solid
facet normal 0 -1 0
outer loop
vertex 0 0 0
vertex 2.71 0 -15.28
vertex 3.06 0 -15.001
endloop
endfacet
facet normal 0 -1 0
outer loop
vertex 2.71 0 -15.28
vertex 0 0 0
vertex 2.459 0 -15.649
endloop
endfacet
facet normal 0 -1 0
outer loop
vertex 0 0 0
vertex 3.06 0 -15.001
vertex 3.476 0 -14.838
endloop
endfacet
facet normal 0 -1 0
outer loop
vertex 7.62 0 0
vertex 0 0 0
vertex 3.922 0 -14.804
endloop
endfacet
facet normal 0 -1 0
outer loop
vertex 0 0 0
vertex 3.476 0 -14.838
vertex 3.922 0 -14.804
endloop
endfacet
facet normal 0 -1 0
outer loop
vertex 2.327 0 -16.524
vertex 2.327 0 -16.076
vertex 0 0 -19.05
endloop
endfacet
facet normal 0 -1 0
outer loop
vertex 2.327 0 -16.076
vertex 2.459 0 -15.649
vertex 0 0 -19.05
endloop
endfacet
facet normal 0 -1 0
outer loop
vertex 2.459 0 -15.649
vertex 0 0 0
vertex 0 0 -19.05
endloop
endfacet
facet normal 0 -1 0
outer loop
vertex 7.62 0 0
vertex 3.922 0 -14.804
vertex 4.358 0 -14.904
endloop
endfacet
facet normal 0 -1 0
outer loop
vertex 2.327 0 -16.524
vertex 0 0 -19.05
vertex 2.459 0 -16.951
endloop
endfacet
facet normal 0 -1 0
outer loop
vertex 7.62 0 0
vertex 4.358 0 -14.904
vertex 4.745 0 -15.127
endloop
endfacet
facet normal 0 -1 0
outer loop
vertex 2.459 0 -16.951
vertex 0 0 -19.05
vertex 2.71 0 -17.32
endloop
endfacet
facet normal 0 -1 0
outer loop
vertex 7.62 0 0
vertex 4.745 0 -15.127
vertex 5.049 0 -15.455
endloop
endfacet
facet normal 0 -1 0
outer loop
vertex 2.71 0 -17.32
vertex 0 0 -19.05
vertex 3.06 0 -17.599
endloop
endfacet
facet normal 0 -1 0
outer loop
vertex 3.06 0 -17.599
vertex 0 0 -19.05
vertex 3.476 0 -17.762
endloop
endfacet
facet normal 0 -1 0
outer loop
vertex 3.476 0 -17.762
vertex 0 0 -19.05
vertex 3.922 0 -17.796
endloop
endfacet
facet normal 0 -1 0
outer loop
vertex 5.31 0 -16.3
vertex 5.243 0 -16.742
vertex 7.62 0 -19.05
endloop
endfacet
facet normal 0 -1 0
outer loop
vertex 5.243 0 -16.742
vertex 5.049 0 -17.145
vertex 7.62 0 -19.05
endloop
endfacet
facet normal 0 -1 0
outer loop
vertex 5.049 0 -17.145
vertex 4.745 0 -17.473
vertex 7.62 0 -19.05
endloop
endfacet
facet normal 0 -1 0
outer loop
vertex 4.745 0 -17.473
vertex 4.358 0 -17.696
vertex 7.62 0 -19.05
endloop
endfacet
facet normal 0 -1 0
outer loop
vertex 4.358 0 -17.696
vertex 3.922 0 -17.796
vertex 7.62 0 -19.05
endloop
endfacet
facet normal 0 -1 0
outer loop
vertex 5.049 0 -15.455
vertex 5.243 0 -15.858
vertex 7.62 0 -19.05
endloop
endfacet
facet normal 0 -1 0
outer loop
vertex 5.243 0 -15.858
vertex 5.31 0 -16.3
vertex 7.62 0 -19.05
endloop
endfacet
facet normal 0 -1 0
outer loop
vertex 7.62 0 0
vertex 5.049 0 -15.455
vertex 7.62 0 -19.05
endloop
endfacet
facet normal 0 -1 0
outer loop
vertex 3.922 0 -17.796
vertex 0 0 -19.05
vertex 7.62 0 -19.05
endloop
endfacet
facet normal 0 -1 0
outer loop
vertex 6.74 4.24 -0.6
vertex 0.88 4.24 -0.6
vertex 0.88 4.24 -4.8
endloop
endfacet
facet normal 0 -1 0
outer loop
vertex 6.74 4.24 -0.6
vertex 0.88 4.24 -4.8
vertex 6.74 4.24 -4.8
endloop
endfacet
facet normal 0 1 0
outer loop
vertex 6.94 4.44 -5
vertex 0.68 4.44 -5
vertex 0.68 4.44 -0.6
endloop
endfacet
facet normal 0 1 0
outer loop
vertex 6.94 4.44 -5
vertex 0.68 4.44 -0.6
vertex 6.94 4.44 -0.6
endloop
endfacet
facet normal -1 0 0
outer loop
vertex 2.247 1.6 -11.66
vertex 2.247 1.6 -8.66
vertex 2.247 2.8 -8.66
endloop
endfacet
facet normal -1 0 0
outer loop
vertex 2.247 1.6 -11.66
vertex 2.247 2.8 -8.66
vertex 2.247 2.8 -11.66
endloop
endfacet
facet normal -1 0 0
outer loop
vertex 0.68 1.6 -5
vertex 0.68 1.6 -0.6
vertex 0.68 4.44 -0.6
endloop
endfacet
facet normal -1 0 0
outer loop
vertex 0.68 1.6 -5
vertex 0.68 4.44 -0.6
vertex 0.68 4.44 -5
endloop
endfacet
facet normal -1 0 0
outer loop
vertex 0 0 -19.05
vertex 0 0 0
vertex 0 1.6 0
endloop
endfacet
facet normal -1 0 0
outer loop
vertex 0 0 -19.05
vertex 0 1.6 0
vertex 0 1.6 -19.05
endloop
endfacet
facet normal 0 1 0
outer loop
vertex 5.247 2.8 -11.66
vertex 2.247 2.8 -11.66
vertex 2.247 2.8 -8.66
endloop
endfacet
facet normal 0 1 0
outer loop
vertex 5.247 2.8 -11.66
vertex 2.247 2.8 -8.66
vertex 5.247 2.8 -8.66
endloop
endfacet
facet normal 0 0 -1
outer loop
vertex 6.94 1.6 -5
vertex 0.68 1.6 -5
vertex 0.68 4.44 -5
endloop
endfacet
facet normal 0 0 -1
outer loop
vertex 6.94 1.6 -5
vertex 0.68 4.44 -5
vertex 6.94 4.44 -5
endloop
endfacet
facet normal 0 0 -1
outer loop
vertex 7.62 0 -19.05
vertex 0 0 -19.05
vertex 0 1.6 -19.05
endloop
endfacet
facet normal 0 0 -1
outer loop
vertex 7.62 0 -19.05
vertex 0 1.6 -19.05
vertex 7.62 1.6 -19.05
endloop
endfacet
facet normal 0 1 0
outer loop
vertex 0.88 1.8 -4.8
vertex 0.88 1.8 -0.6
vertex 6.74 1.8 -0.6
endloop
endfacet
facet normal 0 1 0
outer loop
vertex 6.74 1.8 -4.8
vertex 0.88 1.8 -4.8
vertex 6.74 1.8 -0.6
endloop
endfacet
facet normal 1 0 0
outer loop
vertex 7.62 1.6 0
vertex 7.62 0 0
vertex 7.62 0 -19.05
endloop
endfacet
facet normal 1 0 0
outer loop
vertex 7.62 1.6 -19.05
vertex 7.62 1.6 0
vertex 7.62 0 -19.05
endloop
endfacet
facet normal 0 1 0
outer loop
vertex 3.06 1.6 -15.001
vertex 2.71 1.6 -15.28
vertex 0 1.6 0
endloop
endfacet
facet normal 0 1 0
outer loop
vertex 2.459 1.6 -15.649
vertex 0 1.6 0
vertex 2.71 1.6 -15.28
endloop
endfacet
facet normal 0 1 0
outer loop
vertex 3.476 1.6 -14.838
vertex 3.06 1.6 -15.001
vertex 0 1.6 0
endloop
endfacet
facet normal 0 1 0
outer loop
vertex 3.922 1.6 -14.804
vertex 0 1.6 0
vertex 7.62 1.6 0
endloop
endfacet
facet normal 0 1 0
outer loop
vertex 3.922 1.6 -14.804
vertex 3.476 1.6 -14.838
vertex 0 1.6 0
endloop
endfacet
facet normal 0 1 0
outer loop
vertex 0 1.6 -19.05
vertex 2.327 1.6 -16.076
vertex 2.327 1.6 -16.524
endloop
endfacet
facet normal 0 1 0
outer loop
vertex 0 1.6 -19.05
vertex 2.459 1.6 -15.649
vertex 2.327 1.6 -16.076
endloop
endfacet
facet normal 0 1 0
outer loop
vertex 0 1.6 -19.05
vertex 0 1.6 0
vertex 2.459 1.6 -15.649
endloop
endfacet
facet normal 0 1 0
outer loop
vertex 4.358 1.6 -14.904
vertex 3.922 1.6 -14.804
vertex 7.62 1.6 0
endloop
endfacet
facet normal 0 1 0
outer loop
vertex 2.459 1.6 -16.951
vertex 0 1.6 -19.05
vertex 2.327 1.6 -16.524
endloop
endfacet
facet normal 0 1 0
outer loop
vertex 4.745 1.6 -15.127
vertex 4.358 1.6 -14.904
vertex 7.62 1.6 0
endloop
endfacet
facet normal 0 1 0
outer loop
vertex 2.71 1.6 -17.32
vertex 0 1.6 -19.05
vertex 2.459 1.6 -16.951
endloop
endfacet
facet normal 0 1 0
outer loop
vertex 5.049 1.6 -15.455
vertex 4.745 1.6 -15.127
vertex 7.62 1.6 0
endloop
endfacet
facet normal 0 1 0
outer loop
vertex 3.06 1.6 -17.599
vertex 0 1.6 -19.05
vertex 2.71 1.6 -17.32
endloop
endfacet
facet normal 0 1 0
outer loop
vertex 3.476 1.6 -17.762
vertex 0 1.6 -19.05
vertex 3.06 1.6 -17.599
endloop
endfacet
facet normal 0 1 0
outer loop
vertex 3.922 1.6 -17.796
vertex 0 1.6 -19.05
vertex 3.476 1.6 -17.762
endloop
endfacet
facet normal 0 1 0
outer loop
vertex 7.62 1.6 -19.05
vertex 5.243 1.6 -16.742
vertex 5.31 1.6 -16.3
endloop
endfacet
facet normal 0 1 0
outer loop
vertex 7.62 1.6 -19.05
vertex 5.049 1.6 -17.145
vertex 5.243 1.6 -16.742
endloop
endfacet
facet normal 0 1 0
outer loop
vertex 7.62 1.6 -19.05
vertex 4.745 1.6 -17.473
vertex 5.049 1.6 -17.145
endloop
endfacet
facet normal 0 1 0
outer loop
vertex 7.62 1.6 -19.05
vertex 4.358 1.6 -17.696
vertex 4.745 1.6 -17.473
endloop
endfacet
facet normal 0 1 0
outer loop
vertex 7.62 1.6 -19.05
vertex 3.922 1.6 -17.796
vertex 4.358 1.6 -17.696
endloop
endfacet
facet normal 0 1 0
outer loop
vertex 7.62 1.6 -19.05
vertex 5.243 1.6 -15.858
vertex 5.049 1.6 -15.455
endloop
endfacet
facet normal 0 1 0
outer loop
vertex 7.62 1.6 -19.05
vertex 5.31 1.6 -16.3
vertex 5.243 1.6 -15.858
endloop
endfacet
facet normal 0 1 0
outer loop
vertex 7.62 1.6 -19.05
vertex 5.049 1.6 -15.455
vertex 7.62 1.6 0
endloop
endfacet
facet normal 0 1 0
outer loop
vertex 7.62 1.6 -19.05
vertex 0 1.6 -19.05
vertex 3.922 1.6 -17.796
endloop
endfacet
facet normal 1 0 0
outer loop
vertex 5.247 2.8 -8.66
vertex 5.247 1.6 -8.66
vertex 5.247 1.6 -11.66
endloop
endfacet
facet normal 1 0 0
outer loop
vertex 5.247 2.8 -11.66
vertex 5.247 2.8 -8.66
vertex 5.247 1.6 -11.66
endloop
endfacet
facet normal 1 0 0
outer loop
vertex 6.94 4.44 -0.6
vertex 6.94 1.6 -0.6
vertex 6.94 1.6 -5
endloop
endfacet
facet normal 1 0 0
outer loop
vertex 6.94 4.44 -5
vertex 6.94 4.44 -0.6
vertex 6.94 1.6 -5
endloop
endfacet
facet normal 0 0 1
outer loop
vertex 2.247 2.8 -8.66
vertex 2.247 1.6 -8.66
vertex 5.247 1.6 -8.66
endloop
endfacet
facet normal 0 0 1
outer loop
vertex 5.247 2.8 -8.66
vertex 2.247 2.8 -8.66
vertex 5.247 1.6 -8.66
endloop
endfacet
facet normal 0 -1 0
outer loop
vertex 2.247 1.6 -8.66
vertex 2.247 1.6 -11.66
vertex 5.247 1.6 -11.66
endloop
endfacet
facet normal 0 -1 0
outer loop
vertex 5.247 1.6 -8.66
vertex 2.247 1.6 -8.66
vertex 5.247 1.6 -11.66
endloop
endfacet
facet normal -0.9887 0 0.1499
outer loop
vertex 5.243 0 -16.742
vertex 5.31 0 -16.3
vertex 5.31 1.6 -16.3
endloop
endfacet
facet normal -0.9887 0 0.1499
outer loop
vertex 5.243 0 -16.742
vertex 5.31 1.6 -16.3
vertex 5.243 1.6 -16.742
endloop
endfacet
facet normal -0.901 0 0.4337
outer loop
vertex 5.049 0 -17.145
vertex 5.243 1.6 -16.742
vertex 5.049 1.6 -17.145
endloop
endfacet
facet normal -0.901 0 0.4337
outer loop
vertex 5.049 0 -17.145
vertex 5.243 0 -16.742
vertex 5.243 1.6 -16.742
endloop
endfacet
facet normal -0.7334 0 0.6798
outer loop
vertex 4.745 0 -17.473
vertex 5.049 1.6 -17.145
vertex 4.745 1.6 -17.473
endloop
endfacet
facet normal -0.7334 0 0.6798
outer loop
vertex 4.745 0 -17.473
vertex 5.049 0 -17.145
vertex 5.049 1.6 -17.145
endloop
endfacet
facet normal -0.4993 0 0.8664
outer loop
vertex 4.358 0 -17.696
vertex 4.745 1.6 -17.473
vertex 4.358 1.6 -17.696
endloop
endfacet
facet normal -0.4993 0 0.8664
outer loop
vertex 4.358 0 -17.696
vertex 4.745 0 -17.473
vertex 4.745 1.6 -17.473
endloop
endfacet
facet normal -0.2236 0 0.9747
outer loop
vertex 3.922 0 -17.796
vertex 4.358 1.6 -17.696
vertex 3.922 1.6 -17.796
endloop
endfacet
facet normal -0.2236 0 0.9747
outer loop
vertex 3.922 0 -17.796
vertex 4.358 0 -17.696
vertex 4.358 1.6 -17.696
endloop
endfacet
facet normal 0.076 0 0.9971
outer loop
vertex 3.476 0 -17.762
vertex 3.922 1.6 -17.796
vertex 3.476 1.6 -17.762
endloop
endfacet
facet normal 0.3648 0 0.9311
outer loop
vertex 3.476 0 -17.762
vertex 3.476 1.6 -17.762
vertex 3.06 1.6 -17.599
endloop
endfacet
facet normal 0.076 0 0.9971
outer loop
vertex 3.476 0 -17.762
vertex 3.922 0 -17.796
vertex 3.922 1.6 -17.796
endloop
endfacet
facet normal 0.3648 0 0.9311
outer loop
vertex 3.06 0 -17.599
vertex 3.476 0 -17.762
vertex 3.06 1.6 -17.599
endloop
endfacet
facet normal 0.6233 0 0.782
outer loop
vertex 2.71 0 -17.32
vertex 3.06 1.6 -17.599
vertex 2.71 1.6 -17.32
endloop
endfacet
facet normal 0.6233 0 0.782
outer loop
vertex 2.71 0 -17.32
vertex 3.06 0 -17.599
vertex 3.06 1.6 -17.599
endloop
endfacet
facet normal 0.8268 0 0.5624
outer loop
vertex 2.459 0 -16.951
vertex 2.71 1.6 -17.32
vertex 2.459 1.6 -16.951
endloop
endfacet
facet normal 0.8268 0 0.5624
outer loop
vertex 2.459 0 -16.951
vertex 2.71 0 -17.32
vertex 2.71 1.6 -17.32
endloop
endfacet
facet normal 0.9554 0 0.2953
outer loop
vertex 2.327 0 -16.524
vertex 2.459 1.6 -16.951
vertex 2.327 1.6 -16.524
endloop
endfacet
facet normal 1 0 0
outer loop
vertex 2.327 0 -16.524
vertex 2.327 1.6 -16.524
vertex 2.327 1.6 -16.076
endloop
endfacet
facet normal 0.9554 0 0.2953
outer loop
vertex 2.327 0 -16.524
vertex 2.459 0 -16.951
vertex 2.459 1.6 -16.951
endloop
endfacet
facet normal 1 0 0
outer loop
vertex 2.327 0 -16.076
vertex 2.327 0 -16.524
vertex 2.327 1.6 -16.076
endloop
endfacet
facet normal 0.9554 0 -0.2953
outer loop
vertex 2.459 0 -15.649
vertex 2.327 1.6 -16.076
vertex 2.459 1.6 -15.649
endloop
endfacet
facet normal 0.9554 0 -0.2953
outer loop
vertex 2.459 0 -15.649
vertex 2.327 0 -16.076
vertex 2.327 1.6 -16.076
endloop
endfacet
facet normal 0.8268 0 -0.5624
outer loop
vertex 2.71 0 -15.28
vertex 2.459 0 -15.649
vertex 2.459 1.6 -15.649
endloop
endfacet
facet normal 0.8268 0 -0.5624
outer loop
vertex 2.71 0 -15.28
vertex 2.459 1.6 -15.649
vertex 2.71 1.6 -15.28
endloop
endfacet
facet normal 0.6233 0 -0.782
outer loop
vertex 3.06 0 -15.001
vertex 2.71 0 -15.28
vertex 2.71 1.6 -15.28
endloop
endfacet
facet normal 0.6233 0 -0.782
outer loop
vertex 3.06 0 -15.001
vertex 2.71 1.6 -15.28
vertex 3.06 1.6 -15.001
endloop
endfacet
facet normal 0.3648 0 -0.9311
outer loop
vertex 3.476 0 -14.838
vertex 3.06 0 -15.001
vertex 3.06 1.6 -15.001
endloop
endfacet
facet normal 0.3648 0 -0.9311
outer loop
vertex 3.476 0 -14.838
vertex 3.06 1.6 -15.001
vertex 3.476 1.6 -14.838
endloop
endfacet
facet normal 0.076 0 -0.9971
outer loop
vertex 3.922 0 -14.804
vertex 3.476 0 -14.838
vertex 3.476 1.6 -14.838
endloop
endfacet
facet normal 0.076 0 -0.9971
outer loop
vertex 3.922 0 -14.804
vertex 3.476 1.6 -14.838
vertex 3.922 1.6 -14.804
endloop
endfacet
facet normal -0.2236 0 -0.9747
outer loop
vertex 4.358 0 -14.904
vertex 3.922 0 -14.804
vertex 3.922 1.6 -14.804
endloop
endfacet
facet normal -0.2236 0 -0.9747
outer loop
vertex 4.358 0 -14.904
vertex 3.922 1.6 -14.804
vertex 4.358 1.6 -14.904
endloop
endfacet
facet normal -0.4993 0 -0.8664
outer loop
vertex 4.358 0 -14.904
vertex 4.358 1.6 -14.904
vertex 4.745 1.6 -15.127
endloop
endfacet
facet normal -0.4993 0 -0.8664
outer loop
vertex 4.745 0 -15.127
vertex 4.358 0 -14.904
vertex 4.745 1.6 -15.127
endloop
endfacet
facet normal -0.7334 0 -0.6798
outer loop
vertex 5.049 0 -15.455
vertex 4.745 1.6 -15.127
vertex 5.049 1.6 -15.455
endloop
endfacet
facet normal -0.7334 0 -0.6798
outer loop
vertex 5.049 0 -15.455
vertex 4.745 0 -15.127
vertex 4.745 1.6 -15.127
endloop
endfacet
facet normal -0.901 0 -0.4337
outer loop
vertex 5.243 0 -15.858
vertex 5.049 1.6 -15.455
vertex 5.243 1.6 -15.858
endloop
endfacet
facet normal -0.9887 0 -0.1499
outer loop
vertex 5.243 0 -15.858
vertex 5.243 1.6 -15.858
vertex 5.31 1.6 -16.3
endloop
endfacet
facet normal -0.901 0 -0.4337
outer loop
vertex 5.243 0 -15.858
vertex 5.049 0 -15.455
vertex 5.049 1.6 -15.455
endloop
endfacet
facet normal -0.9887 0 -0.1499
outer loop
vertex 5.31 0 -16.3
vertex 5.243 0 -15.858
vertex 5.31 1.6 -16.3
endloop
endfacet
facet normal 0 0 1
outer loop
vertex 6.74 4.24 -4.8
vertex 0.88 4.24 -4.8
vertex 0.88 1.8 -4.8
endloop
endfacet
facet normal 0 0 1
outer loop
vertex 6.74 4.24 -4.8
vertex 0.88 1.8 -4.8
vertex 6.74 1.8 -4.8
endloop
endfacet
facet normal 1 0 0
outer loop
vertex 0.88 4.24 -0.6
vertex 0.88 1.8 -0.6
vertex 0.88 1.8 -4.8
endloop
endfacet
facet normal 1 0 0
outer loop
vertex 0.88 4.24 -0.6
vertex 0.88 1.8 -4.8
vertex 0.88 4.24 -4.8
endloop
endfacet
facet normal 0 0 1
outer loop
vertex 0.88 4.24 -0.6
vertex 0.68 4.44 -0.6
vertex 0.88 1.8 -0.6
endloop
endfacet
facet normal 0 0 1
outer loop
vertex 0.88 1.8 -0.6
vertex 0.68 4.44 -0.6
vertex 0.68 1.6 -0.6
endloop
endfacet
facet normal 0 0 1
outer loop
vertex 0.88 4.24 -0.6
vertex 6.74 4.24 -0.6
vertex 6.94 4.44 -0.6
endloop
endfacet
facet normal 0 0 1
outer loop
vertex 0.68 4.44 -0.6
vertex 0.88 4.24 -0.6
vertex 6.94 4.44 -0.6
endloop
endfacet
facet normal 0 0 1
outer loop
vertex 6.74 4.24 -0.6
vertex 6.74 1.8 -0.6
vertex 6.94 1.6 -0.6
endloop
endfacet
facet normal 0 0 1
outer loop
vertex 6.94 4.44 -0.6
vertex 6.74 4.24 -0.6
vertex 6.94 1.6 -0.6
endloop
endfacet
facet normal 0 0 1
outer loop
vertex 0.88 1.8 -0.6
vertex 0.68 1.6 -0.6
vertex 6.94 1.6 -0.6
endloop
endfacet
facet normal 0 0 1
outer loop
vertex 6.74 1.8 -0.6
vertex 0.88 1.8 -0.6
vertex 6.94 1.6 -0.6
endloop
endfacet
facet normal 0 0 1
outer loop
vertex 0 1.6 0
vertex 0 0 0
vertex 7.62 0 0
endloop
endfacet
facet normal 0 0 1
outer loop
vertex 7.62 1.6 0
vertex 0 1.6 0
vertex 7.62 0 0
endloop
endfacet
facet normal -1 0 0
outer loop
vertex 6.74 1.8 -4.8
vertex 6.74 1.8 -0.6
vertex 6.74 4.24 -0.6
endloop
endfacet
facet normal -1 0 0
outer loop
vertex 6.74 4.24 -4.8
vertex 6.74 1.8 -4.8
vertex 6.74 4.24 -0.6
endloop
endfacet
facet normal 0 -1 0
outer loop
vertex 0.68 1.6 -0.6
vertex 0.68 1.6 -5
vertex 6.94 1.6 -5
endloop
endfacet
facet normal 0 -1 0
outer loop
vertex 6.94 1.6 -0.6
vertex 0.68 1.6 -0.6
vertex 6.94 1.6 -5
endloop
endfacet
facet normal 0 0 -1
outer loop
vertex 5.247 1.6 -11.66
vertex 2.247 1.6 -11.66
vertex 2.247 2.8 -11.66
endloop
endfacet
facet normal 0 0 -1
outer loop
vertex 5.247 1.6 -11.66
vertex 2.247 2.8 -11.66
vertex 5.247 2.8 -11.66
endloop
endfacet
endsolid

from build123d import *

# Parameters (mm, degrees)
SKETCH1_W           = 7.62
SKETCH1_H           = 19.05
SKETCH1_R           = 1.5
BOSS_EXTRUDE1_DEPTH = 1.6
SKETCH2_W           = 3
SKETCH2_H           = 3
BOSS_EXTRUDE2_DEPTH = 1.2
SKETCH3_W           = 6.26
SKETCH3_H           = 4.4
BOSS_EXTRUDE3_DEPTH = 2.84
SKETCH4_W           = 5.86
SKETCH4_H           = 2.44
CUT_EXTRUDE1_DEPTH  = 4.2


with BuildPart() as part:
    # Sketch1 → Boss-Extrude1 (new body)
    with BuildSketch(Plane(origin=(0, 0, 0), x_dir=(1, 0, 0), z_dir=(0, 1, 0))):
        with Locations((3.81, 9.525)):
            Rectangle(SKETCH1_W, SKETCH1_H)
        with Locations((3.81, 16.3)):
            Circle(SKETCH1_R, mode=Mode.SUBTRACT)
    extrude(amount=BOSS_EXTRUDE1_DEPTH)


with BuildPart() as body_2:
    # Sketch2 → Boss-Extrude2 (new body)
    with BuildSketch(Plane(origin=(0, 1.6, 0), x_dir=(1, 0, 0), z_dir=(0, 1, 0))):
        with Locations((3.746662363, 10.16)):
            Rectangle(SKETCH2_W, SKETCH2_H)
    extrude(amount=BOSS_EXTRUDE2_DEPTH)


with BuildPart() as body_3:
    # Sketch3 → Boss-Extrude3 (new body)
    with BuildSketch(Plane(origin=(0, 1.6, 0), x_dir=(1, 0, 0), z_dir=(0, 1, 0))):
        with Locations((3.81, 2.8)):
            Rectangle(SKETCH3_W, SKETCH3_H)
    extrude(amount=BOSS_EXTRUDE3_DEPTH)

    # Sketch4 → Cut-Extrude1 (cut)
    with BuildSketch(Plane.XY.offset(-0.6)):
        with Locations((3.81, 3.02)):
            Rectangle(SKETCH4_W, SKETCH4_H)
    extrude(amount=-CUT_EXTRUDE1_DEPTH, mode=Mode.SUBTRACT)


solid = Compound([part.part, body_2.part, body_3.part])
